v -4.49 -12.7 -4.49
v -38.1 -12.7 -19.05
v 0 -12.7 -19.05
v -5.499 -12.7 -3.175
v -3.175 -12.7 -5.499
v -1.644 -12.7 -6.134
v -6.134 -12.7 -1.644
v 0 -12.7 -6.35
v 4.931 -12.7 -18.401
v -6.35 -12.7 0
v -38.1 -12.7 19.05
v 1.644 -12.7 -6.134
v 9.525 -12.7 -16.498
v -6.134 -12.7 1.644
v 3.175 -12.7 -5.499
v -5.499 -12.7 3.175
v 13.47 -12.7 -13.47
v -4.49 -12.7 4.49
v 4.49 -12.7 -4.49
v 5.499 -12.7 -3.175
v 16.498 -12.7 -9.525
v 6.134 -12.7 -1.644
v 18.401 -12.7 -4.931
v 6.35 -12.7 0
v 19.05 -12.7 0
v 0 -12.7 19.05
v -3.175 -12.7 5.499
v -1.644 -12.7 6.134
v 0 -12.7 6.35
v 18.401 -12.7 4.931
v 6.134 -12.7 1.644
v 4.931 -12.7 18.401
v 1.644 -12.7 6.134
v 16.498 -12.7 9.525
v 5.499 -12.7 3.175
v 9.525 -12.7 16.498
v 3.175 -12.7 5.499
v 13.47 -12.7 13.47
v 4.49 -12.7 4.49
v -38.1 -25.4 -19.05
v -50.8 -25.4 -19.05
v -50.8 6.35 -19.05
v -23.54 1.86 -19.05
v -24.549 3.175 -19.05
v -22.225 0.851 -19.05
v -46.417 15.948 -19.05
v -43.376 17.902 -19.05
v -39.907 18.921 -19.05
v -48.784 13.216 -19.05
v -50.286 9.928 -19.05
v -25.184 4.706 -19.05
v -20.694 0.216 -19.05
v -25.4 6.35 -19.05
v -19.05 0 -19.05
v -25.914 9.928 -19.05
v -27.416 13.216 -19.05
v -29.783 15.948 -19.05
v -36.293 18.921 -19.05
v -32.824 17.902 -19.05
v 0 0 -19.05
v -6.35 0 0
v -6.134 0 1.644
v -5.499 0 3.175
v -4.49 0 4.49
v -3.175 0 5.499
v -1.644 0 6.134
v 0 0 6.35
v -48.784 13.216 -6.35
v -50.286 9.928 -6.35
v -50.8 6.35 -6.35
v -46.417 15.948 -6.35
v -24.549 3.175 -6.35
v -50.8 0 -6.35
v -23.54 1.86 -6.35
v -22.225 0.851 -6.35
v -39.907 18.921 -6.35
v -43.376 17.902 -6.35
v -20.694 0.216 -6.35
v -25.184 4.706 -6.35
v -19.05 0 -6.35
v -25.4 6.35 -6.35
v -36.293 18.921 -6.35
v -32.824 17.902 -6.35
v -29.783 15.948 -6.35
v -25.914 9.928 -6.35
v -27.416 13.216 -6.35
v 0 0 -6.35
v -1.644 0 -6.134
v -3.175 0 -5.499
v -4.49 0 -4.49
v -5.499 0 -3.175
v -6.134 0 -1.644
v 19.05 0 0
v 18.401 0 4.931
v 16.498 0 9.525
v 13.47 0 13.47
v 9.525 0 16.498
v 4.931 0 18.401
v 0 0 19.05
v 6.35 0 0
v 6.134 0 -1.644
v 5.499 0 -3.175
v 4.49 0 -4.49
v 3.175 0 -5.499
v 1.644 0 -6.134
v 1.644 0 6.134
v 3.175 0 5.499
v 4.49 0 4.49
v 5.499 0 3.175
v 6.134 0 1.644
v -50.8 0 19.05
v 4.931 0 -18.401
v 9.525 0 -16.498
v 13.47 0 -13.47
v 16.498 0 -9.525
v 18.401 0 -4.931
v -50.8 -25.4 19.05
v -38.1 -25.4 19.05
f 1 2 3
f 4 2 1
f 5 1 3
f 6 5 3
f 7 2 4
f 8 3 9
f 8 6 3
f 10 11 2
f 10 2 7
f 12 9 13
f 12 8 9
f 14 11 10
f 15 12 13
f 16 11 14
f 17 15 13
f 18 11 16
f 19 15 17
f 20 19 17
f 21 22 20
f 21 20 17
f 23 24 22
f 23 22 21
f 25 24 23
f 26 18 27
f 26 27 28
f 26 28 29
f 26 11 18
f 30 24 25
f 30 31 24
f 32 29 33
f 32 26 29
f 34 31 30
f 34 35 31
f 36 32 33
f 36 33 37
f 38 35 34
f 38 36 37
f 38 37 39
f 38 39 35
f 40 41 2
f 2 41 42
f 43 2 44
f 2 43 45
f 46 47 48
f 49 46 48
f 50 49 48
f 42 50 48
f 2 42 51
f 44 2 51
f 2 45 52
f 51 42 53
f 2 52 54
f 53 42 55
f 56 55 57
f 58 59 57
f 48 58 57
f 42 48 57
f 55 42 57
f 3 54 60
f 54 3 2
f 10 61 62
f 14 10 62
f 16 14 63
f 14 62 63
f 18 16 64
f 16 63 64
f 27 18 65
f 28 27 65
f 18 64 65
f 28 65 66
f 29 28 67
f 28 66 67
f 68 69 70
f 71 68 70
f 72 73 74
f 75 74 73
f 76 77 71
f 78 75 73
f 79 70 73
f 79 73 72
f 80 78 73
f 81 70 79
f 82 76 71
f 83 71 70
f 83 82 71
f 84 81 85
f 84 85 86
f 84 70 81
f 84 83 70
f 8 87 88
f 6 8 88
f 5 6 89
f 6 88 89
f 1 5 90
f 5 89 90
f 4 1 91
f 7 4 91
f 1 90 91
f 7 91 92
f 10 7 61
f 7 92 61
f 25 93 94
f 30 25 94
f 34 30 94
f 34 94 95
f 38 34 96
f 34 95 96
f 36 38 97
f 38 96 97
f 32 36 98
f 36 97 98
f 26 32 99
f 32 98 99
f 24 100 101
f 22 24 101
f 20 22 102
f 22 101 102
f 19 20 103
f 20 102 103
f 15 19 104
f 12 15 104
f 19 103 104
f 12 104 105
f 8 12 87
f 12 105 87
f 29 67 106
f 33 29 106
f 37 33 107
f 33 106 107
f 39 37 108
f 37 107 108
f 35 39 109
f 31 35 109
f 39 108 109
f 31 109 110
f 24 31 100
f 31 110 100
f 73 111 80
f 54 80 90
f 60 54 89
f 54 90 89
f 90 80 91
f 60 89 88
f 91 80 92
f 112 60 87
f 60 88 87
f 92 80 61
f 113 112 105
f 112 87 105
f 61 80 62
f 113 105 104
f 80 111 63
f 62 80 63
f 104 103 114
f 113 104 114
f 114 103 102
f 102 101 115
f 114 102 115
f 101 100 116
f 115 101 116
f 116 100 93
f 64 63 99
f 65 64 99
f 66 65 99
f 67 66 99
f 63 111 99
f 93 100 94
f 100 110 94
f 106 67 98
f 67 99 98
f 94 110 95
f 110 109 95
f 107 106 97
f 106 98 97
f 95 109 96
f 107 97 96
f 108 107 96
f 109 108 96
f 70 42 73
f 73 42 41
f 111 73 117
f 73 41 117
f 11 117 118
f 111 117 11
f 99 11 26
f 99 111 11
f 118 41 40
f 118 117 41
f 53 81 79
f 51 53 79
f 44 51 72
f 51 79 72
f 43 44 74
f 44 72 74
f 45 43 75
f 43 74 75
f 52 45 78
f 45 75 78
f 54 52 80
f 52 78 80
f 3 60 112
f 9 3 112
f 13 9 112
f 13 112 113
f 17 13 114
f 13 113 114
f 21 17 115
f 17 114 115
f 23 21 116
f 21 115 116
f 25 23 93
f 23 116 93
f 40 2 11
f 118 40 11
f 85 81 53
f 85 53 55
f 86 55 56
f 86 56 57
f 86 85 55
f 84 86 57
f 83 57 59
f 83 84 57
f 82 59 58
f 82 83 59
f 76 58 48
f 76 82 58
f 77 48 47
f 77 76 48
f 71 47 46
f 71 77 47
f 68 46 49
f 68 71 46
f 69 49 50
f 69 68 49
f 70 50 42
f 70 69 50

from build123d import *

# Parameters (mm, degrees)
F1_DEPTH = 12.7
F2_W     = 12.7
F2_H     = 19.05
F3_DEPTH = 12.7
F4_W     = 31.75
F4_H     = 12.7
F5_DEPTH = 6.35
F6_R     = 6.35
F7_DEPTH = 25.4
F9_DEPTH = 12.7


with BuildPart() as f1:
    # F0 (on Front) → F1 (new body)
    with BuildSketch(Plane.XZ):
        with BuildLine():
            ThreePointArc((0, -19.05), (-13.4703841816, -13.4703841816), (-19.05, 0))
            Line((-19.05, 0), (-50.8, 0))
            Line((-50.8, 0), (-50.8, -19.05))
            Line((-50.8, -19.05), (0, -19.05))
        make_face()
        with BuildLine():
            ThreePointArc((0, 19.05), (-13.4703841816, 13.4703841816), (-19.05, 0))
            Line((-19.05, 0), (-6.35, 0))
            ThreePointArc((-6.35, 0), (-4.4901280605, 4.4901280605), (0, 6.35))
            Line((0, 6.35), (0, 19.05))
        make_face()
        with BuildLine():
            Line((-50.8, 0), (-19.05, 0))
            ThreePointArc((-19.05, 0), (-13.4703841816, 13.4703841816), (0, 19.05))
            Line((0, 19.05), (-50.8, 19.05))
            Line((-50.8, 19.05), (-50.8, 0))
        make_face()
        with BuildLine():
            Line((-6.35, 0), (-19.05, 0))
            ThreePointArc((-19.05, 0), (-13.4703841816, -13.4703841816), (0, -19.05))
            Line((0, -19.05), (0, -6.35))
            ThreePointArc((0, -6.35), (-4.4901280605, -4.4901280605), (-6.35, 0))
        make_face()
        with BuildLine():
            ThreePointArc((19.05, 0), (13.4703841816, 13.4703841816), (0, 19.05))
            Line((0, 19.05), (0, 6.35))
            ThreePointArc((0, 6.35), (4.4901280605, 4.4901280605), (6.35, 0))
            Line((6.35, 0), (19.05, 0))
        make_face()
        with BuildLine():
            Line((0, -6.35), (0, -19.05))
            ThreePointArc((0, -19.05), (13.4703841816, -13.4703841816), (19.05, 0))
            Line((19.05, 0), (6.35, 0))
            ThreePointArc((6.35, 0), (4.4901280605, -4.4901280605), (0, -6.35))
        make_face()
    extrude(amount=F1_DEPTH)

    # F2 (on face) → F3 (join)
    with BuildSketch(Plane.XZ.offset(12.7)):
        with Locations((-44.45, -9.525)):
            Rectangle(F2_W, F2_H)
        with Locations((-44.45, 9.525)):
            Rectangle(F2_W, F2_H)
    extrude(amount=F3_DEPTH)

    # F4 (on face) → F5 (join)
    with BuildSketch(Plane(origin=(0, 0, 0), x_dir=(-1, 0, 0), z_dir=(0, 1, 0))):
        with Locations((34.925, -12.7)):
            Rectangle(F4_W, F4_H)
    extrude(amount=F5_DEPTH)

    # F6 (on face) → F7 (cut)
    with BuildSketch(Plane.XY.offset(-6.35)):
        with Locations((-19.05, 6.35)):
            Circle(F6_R)
    extrude(amount=-F7_DEPTH, mode=Mode.SUBTRACT)

    # F8 (on face) → F9 (join)
    with BuildSketch(Plane.XY.offset(-6.35)):
        with BuildLine():
            ThreePointArc((-25.4, 6.35), (-38.1, 19.05), (-50.8, 6.35))
            Line((-50.8, 6.35), (-38.1, 6.35))
            Line((-38.1, 6.35), (-25.4, 6.35))
        make_face()
    extrude(amount=-F9_DEPTH)


solid = f1.part
